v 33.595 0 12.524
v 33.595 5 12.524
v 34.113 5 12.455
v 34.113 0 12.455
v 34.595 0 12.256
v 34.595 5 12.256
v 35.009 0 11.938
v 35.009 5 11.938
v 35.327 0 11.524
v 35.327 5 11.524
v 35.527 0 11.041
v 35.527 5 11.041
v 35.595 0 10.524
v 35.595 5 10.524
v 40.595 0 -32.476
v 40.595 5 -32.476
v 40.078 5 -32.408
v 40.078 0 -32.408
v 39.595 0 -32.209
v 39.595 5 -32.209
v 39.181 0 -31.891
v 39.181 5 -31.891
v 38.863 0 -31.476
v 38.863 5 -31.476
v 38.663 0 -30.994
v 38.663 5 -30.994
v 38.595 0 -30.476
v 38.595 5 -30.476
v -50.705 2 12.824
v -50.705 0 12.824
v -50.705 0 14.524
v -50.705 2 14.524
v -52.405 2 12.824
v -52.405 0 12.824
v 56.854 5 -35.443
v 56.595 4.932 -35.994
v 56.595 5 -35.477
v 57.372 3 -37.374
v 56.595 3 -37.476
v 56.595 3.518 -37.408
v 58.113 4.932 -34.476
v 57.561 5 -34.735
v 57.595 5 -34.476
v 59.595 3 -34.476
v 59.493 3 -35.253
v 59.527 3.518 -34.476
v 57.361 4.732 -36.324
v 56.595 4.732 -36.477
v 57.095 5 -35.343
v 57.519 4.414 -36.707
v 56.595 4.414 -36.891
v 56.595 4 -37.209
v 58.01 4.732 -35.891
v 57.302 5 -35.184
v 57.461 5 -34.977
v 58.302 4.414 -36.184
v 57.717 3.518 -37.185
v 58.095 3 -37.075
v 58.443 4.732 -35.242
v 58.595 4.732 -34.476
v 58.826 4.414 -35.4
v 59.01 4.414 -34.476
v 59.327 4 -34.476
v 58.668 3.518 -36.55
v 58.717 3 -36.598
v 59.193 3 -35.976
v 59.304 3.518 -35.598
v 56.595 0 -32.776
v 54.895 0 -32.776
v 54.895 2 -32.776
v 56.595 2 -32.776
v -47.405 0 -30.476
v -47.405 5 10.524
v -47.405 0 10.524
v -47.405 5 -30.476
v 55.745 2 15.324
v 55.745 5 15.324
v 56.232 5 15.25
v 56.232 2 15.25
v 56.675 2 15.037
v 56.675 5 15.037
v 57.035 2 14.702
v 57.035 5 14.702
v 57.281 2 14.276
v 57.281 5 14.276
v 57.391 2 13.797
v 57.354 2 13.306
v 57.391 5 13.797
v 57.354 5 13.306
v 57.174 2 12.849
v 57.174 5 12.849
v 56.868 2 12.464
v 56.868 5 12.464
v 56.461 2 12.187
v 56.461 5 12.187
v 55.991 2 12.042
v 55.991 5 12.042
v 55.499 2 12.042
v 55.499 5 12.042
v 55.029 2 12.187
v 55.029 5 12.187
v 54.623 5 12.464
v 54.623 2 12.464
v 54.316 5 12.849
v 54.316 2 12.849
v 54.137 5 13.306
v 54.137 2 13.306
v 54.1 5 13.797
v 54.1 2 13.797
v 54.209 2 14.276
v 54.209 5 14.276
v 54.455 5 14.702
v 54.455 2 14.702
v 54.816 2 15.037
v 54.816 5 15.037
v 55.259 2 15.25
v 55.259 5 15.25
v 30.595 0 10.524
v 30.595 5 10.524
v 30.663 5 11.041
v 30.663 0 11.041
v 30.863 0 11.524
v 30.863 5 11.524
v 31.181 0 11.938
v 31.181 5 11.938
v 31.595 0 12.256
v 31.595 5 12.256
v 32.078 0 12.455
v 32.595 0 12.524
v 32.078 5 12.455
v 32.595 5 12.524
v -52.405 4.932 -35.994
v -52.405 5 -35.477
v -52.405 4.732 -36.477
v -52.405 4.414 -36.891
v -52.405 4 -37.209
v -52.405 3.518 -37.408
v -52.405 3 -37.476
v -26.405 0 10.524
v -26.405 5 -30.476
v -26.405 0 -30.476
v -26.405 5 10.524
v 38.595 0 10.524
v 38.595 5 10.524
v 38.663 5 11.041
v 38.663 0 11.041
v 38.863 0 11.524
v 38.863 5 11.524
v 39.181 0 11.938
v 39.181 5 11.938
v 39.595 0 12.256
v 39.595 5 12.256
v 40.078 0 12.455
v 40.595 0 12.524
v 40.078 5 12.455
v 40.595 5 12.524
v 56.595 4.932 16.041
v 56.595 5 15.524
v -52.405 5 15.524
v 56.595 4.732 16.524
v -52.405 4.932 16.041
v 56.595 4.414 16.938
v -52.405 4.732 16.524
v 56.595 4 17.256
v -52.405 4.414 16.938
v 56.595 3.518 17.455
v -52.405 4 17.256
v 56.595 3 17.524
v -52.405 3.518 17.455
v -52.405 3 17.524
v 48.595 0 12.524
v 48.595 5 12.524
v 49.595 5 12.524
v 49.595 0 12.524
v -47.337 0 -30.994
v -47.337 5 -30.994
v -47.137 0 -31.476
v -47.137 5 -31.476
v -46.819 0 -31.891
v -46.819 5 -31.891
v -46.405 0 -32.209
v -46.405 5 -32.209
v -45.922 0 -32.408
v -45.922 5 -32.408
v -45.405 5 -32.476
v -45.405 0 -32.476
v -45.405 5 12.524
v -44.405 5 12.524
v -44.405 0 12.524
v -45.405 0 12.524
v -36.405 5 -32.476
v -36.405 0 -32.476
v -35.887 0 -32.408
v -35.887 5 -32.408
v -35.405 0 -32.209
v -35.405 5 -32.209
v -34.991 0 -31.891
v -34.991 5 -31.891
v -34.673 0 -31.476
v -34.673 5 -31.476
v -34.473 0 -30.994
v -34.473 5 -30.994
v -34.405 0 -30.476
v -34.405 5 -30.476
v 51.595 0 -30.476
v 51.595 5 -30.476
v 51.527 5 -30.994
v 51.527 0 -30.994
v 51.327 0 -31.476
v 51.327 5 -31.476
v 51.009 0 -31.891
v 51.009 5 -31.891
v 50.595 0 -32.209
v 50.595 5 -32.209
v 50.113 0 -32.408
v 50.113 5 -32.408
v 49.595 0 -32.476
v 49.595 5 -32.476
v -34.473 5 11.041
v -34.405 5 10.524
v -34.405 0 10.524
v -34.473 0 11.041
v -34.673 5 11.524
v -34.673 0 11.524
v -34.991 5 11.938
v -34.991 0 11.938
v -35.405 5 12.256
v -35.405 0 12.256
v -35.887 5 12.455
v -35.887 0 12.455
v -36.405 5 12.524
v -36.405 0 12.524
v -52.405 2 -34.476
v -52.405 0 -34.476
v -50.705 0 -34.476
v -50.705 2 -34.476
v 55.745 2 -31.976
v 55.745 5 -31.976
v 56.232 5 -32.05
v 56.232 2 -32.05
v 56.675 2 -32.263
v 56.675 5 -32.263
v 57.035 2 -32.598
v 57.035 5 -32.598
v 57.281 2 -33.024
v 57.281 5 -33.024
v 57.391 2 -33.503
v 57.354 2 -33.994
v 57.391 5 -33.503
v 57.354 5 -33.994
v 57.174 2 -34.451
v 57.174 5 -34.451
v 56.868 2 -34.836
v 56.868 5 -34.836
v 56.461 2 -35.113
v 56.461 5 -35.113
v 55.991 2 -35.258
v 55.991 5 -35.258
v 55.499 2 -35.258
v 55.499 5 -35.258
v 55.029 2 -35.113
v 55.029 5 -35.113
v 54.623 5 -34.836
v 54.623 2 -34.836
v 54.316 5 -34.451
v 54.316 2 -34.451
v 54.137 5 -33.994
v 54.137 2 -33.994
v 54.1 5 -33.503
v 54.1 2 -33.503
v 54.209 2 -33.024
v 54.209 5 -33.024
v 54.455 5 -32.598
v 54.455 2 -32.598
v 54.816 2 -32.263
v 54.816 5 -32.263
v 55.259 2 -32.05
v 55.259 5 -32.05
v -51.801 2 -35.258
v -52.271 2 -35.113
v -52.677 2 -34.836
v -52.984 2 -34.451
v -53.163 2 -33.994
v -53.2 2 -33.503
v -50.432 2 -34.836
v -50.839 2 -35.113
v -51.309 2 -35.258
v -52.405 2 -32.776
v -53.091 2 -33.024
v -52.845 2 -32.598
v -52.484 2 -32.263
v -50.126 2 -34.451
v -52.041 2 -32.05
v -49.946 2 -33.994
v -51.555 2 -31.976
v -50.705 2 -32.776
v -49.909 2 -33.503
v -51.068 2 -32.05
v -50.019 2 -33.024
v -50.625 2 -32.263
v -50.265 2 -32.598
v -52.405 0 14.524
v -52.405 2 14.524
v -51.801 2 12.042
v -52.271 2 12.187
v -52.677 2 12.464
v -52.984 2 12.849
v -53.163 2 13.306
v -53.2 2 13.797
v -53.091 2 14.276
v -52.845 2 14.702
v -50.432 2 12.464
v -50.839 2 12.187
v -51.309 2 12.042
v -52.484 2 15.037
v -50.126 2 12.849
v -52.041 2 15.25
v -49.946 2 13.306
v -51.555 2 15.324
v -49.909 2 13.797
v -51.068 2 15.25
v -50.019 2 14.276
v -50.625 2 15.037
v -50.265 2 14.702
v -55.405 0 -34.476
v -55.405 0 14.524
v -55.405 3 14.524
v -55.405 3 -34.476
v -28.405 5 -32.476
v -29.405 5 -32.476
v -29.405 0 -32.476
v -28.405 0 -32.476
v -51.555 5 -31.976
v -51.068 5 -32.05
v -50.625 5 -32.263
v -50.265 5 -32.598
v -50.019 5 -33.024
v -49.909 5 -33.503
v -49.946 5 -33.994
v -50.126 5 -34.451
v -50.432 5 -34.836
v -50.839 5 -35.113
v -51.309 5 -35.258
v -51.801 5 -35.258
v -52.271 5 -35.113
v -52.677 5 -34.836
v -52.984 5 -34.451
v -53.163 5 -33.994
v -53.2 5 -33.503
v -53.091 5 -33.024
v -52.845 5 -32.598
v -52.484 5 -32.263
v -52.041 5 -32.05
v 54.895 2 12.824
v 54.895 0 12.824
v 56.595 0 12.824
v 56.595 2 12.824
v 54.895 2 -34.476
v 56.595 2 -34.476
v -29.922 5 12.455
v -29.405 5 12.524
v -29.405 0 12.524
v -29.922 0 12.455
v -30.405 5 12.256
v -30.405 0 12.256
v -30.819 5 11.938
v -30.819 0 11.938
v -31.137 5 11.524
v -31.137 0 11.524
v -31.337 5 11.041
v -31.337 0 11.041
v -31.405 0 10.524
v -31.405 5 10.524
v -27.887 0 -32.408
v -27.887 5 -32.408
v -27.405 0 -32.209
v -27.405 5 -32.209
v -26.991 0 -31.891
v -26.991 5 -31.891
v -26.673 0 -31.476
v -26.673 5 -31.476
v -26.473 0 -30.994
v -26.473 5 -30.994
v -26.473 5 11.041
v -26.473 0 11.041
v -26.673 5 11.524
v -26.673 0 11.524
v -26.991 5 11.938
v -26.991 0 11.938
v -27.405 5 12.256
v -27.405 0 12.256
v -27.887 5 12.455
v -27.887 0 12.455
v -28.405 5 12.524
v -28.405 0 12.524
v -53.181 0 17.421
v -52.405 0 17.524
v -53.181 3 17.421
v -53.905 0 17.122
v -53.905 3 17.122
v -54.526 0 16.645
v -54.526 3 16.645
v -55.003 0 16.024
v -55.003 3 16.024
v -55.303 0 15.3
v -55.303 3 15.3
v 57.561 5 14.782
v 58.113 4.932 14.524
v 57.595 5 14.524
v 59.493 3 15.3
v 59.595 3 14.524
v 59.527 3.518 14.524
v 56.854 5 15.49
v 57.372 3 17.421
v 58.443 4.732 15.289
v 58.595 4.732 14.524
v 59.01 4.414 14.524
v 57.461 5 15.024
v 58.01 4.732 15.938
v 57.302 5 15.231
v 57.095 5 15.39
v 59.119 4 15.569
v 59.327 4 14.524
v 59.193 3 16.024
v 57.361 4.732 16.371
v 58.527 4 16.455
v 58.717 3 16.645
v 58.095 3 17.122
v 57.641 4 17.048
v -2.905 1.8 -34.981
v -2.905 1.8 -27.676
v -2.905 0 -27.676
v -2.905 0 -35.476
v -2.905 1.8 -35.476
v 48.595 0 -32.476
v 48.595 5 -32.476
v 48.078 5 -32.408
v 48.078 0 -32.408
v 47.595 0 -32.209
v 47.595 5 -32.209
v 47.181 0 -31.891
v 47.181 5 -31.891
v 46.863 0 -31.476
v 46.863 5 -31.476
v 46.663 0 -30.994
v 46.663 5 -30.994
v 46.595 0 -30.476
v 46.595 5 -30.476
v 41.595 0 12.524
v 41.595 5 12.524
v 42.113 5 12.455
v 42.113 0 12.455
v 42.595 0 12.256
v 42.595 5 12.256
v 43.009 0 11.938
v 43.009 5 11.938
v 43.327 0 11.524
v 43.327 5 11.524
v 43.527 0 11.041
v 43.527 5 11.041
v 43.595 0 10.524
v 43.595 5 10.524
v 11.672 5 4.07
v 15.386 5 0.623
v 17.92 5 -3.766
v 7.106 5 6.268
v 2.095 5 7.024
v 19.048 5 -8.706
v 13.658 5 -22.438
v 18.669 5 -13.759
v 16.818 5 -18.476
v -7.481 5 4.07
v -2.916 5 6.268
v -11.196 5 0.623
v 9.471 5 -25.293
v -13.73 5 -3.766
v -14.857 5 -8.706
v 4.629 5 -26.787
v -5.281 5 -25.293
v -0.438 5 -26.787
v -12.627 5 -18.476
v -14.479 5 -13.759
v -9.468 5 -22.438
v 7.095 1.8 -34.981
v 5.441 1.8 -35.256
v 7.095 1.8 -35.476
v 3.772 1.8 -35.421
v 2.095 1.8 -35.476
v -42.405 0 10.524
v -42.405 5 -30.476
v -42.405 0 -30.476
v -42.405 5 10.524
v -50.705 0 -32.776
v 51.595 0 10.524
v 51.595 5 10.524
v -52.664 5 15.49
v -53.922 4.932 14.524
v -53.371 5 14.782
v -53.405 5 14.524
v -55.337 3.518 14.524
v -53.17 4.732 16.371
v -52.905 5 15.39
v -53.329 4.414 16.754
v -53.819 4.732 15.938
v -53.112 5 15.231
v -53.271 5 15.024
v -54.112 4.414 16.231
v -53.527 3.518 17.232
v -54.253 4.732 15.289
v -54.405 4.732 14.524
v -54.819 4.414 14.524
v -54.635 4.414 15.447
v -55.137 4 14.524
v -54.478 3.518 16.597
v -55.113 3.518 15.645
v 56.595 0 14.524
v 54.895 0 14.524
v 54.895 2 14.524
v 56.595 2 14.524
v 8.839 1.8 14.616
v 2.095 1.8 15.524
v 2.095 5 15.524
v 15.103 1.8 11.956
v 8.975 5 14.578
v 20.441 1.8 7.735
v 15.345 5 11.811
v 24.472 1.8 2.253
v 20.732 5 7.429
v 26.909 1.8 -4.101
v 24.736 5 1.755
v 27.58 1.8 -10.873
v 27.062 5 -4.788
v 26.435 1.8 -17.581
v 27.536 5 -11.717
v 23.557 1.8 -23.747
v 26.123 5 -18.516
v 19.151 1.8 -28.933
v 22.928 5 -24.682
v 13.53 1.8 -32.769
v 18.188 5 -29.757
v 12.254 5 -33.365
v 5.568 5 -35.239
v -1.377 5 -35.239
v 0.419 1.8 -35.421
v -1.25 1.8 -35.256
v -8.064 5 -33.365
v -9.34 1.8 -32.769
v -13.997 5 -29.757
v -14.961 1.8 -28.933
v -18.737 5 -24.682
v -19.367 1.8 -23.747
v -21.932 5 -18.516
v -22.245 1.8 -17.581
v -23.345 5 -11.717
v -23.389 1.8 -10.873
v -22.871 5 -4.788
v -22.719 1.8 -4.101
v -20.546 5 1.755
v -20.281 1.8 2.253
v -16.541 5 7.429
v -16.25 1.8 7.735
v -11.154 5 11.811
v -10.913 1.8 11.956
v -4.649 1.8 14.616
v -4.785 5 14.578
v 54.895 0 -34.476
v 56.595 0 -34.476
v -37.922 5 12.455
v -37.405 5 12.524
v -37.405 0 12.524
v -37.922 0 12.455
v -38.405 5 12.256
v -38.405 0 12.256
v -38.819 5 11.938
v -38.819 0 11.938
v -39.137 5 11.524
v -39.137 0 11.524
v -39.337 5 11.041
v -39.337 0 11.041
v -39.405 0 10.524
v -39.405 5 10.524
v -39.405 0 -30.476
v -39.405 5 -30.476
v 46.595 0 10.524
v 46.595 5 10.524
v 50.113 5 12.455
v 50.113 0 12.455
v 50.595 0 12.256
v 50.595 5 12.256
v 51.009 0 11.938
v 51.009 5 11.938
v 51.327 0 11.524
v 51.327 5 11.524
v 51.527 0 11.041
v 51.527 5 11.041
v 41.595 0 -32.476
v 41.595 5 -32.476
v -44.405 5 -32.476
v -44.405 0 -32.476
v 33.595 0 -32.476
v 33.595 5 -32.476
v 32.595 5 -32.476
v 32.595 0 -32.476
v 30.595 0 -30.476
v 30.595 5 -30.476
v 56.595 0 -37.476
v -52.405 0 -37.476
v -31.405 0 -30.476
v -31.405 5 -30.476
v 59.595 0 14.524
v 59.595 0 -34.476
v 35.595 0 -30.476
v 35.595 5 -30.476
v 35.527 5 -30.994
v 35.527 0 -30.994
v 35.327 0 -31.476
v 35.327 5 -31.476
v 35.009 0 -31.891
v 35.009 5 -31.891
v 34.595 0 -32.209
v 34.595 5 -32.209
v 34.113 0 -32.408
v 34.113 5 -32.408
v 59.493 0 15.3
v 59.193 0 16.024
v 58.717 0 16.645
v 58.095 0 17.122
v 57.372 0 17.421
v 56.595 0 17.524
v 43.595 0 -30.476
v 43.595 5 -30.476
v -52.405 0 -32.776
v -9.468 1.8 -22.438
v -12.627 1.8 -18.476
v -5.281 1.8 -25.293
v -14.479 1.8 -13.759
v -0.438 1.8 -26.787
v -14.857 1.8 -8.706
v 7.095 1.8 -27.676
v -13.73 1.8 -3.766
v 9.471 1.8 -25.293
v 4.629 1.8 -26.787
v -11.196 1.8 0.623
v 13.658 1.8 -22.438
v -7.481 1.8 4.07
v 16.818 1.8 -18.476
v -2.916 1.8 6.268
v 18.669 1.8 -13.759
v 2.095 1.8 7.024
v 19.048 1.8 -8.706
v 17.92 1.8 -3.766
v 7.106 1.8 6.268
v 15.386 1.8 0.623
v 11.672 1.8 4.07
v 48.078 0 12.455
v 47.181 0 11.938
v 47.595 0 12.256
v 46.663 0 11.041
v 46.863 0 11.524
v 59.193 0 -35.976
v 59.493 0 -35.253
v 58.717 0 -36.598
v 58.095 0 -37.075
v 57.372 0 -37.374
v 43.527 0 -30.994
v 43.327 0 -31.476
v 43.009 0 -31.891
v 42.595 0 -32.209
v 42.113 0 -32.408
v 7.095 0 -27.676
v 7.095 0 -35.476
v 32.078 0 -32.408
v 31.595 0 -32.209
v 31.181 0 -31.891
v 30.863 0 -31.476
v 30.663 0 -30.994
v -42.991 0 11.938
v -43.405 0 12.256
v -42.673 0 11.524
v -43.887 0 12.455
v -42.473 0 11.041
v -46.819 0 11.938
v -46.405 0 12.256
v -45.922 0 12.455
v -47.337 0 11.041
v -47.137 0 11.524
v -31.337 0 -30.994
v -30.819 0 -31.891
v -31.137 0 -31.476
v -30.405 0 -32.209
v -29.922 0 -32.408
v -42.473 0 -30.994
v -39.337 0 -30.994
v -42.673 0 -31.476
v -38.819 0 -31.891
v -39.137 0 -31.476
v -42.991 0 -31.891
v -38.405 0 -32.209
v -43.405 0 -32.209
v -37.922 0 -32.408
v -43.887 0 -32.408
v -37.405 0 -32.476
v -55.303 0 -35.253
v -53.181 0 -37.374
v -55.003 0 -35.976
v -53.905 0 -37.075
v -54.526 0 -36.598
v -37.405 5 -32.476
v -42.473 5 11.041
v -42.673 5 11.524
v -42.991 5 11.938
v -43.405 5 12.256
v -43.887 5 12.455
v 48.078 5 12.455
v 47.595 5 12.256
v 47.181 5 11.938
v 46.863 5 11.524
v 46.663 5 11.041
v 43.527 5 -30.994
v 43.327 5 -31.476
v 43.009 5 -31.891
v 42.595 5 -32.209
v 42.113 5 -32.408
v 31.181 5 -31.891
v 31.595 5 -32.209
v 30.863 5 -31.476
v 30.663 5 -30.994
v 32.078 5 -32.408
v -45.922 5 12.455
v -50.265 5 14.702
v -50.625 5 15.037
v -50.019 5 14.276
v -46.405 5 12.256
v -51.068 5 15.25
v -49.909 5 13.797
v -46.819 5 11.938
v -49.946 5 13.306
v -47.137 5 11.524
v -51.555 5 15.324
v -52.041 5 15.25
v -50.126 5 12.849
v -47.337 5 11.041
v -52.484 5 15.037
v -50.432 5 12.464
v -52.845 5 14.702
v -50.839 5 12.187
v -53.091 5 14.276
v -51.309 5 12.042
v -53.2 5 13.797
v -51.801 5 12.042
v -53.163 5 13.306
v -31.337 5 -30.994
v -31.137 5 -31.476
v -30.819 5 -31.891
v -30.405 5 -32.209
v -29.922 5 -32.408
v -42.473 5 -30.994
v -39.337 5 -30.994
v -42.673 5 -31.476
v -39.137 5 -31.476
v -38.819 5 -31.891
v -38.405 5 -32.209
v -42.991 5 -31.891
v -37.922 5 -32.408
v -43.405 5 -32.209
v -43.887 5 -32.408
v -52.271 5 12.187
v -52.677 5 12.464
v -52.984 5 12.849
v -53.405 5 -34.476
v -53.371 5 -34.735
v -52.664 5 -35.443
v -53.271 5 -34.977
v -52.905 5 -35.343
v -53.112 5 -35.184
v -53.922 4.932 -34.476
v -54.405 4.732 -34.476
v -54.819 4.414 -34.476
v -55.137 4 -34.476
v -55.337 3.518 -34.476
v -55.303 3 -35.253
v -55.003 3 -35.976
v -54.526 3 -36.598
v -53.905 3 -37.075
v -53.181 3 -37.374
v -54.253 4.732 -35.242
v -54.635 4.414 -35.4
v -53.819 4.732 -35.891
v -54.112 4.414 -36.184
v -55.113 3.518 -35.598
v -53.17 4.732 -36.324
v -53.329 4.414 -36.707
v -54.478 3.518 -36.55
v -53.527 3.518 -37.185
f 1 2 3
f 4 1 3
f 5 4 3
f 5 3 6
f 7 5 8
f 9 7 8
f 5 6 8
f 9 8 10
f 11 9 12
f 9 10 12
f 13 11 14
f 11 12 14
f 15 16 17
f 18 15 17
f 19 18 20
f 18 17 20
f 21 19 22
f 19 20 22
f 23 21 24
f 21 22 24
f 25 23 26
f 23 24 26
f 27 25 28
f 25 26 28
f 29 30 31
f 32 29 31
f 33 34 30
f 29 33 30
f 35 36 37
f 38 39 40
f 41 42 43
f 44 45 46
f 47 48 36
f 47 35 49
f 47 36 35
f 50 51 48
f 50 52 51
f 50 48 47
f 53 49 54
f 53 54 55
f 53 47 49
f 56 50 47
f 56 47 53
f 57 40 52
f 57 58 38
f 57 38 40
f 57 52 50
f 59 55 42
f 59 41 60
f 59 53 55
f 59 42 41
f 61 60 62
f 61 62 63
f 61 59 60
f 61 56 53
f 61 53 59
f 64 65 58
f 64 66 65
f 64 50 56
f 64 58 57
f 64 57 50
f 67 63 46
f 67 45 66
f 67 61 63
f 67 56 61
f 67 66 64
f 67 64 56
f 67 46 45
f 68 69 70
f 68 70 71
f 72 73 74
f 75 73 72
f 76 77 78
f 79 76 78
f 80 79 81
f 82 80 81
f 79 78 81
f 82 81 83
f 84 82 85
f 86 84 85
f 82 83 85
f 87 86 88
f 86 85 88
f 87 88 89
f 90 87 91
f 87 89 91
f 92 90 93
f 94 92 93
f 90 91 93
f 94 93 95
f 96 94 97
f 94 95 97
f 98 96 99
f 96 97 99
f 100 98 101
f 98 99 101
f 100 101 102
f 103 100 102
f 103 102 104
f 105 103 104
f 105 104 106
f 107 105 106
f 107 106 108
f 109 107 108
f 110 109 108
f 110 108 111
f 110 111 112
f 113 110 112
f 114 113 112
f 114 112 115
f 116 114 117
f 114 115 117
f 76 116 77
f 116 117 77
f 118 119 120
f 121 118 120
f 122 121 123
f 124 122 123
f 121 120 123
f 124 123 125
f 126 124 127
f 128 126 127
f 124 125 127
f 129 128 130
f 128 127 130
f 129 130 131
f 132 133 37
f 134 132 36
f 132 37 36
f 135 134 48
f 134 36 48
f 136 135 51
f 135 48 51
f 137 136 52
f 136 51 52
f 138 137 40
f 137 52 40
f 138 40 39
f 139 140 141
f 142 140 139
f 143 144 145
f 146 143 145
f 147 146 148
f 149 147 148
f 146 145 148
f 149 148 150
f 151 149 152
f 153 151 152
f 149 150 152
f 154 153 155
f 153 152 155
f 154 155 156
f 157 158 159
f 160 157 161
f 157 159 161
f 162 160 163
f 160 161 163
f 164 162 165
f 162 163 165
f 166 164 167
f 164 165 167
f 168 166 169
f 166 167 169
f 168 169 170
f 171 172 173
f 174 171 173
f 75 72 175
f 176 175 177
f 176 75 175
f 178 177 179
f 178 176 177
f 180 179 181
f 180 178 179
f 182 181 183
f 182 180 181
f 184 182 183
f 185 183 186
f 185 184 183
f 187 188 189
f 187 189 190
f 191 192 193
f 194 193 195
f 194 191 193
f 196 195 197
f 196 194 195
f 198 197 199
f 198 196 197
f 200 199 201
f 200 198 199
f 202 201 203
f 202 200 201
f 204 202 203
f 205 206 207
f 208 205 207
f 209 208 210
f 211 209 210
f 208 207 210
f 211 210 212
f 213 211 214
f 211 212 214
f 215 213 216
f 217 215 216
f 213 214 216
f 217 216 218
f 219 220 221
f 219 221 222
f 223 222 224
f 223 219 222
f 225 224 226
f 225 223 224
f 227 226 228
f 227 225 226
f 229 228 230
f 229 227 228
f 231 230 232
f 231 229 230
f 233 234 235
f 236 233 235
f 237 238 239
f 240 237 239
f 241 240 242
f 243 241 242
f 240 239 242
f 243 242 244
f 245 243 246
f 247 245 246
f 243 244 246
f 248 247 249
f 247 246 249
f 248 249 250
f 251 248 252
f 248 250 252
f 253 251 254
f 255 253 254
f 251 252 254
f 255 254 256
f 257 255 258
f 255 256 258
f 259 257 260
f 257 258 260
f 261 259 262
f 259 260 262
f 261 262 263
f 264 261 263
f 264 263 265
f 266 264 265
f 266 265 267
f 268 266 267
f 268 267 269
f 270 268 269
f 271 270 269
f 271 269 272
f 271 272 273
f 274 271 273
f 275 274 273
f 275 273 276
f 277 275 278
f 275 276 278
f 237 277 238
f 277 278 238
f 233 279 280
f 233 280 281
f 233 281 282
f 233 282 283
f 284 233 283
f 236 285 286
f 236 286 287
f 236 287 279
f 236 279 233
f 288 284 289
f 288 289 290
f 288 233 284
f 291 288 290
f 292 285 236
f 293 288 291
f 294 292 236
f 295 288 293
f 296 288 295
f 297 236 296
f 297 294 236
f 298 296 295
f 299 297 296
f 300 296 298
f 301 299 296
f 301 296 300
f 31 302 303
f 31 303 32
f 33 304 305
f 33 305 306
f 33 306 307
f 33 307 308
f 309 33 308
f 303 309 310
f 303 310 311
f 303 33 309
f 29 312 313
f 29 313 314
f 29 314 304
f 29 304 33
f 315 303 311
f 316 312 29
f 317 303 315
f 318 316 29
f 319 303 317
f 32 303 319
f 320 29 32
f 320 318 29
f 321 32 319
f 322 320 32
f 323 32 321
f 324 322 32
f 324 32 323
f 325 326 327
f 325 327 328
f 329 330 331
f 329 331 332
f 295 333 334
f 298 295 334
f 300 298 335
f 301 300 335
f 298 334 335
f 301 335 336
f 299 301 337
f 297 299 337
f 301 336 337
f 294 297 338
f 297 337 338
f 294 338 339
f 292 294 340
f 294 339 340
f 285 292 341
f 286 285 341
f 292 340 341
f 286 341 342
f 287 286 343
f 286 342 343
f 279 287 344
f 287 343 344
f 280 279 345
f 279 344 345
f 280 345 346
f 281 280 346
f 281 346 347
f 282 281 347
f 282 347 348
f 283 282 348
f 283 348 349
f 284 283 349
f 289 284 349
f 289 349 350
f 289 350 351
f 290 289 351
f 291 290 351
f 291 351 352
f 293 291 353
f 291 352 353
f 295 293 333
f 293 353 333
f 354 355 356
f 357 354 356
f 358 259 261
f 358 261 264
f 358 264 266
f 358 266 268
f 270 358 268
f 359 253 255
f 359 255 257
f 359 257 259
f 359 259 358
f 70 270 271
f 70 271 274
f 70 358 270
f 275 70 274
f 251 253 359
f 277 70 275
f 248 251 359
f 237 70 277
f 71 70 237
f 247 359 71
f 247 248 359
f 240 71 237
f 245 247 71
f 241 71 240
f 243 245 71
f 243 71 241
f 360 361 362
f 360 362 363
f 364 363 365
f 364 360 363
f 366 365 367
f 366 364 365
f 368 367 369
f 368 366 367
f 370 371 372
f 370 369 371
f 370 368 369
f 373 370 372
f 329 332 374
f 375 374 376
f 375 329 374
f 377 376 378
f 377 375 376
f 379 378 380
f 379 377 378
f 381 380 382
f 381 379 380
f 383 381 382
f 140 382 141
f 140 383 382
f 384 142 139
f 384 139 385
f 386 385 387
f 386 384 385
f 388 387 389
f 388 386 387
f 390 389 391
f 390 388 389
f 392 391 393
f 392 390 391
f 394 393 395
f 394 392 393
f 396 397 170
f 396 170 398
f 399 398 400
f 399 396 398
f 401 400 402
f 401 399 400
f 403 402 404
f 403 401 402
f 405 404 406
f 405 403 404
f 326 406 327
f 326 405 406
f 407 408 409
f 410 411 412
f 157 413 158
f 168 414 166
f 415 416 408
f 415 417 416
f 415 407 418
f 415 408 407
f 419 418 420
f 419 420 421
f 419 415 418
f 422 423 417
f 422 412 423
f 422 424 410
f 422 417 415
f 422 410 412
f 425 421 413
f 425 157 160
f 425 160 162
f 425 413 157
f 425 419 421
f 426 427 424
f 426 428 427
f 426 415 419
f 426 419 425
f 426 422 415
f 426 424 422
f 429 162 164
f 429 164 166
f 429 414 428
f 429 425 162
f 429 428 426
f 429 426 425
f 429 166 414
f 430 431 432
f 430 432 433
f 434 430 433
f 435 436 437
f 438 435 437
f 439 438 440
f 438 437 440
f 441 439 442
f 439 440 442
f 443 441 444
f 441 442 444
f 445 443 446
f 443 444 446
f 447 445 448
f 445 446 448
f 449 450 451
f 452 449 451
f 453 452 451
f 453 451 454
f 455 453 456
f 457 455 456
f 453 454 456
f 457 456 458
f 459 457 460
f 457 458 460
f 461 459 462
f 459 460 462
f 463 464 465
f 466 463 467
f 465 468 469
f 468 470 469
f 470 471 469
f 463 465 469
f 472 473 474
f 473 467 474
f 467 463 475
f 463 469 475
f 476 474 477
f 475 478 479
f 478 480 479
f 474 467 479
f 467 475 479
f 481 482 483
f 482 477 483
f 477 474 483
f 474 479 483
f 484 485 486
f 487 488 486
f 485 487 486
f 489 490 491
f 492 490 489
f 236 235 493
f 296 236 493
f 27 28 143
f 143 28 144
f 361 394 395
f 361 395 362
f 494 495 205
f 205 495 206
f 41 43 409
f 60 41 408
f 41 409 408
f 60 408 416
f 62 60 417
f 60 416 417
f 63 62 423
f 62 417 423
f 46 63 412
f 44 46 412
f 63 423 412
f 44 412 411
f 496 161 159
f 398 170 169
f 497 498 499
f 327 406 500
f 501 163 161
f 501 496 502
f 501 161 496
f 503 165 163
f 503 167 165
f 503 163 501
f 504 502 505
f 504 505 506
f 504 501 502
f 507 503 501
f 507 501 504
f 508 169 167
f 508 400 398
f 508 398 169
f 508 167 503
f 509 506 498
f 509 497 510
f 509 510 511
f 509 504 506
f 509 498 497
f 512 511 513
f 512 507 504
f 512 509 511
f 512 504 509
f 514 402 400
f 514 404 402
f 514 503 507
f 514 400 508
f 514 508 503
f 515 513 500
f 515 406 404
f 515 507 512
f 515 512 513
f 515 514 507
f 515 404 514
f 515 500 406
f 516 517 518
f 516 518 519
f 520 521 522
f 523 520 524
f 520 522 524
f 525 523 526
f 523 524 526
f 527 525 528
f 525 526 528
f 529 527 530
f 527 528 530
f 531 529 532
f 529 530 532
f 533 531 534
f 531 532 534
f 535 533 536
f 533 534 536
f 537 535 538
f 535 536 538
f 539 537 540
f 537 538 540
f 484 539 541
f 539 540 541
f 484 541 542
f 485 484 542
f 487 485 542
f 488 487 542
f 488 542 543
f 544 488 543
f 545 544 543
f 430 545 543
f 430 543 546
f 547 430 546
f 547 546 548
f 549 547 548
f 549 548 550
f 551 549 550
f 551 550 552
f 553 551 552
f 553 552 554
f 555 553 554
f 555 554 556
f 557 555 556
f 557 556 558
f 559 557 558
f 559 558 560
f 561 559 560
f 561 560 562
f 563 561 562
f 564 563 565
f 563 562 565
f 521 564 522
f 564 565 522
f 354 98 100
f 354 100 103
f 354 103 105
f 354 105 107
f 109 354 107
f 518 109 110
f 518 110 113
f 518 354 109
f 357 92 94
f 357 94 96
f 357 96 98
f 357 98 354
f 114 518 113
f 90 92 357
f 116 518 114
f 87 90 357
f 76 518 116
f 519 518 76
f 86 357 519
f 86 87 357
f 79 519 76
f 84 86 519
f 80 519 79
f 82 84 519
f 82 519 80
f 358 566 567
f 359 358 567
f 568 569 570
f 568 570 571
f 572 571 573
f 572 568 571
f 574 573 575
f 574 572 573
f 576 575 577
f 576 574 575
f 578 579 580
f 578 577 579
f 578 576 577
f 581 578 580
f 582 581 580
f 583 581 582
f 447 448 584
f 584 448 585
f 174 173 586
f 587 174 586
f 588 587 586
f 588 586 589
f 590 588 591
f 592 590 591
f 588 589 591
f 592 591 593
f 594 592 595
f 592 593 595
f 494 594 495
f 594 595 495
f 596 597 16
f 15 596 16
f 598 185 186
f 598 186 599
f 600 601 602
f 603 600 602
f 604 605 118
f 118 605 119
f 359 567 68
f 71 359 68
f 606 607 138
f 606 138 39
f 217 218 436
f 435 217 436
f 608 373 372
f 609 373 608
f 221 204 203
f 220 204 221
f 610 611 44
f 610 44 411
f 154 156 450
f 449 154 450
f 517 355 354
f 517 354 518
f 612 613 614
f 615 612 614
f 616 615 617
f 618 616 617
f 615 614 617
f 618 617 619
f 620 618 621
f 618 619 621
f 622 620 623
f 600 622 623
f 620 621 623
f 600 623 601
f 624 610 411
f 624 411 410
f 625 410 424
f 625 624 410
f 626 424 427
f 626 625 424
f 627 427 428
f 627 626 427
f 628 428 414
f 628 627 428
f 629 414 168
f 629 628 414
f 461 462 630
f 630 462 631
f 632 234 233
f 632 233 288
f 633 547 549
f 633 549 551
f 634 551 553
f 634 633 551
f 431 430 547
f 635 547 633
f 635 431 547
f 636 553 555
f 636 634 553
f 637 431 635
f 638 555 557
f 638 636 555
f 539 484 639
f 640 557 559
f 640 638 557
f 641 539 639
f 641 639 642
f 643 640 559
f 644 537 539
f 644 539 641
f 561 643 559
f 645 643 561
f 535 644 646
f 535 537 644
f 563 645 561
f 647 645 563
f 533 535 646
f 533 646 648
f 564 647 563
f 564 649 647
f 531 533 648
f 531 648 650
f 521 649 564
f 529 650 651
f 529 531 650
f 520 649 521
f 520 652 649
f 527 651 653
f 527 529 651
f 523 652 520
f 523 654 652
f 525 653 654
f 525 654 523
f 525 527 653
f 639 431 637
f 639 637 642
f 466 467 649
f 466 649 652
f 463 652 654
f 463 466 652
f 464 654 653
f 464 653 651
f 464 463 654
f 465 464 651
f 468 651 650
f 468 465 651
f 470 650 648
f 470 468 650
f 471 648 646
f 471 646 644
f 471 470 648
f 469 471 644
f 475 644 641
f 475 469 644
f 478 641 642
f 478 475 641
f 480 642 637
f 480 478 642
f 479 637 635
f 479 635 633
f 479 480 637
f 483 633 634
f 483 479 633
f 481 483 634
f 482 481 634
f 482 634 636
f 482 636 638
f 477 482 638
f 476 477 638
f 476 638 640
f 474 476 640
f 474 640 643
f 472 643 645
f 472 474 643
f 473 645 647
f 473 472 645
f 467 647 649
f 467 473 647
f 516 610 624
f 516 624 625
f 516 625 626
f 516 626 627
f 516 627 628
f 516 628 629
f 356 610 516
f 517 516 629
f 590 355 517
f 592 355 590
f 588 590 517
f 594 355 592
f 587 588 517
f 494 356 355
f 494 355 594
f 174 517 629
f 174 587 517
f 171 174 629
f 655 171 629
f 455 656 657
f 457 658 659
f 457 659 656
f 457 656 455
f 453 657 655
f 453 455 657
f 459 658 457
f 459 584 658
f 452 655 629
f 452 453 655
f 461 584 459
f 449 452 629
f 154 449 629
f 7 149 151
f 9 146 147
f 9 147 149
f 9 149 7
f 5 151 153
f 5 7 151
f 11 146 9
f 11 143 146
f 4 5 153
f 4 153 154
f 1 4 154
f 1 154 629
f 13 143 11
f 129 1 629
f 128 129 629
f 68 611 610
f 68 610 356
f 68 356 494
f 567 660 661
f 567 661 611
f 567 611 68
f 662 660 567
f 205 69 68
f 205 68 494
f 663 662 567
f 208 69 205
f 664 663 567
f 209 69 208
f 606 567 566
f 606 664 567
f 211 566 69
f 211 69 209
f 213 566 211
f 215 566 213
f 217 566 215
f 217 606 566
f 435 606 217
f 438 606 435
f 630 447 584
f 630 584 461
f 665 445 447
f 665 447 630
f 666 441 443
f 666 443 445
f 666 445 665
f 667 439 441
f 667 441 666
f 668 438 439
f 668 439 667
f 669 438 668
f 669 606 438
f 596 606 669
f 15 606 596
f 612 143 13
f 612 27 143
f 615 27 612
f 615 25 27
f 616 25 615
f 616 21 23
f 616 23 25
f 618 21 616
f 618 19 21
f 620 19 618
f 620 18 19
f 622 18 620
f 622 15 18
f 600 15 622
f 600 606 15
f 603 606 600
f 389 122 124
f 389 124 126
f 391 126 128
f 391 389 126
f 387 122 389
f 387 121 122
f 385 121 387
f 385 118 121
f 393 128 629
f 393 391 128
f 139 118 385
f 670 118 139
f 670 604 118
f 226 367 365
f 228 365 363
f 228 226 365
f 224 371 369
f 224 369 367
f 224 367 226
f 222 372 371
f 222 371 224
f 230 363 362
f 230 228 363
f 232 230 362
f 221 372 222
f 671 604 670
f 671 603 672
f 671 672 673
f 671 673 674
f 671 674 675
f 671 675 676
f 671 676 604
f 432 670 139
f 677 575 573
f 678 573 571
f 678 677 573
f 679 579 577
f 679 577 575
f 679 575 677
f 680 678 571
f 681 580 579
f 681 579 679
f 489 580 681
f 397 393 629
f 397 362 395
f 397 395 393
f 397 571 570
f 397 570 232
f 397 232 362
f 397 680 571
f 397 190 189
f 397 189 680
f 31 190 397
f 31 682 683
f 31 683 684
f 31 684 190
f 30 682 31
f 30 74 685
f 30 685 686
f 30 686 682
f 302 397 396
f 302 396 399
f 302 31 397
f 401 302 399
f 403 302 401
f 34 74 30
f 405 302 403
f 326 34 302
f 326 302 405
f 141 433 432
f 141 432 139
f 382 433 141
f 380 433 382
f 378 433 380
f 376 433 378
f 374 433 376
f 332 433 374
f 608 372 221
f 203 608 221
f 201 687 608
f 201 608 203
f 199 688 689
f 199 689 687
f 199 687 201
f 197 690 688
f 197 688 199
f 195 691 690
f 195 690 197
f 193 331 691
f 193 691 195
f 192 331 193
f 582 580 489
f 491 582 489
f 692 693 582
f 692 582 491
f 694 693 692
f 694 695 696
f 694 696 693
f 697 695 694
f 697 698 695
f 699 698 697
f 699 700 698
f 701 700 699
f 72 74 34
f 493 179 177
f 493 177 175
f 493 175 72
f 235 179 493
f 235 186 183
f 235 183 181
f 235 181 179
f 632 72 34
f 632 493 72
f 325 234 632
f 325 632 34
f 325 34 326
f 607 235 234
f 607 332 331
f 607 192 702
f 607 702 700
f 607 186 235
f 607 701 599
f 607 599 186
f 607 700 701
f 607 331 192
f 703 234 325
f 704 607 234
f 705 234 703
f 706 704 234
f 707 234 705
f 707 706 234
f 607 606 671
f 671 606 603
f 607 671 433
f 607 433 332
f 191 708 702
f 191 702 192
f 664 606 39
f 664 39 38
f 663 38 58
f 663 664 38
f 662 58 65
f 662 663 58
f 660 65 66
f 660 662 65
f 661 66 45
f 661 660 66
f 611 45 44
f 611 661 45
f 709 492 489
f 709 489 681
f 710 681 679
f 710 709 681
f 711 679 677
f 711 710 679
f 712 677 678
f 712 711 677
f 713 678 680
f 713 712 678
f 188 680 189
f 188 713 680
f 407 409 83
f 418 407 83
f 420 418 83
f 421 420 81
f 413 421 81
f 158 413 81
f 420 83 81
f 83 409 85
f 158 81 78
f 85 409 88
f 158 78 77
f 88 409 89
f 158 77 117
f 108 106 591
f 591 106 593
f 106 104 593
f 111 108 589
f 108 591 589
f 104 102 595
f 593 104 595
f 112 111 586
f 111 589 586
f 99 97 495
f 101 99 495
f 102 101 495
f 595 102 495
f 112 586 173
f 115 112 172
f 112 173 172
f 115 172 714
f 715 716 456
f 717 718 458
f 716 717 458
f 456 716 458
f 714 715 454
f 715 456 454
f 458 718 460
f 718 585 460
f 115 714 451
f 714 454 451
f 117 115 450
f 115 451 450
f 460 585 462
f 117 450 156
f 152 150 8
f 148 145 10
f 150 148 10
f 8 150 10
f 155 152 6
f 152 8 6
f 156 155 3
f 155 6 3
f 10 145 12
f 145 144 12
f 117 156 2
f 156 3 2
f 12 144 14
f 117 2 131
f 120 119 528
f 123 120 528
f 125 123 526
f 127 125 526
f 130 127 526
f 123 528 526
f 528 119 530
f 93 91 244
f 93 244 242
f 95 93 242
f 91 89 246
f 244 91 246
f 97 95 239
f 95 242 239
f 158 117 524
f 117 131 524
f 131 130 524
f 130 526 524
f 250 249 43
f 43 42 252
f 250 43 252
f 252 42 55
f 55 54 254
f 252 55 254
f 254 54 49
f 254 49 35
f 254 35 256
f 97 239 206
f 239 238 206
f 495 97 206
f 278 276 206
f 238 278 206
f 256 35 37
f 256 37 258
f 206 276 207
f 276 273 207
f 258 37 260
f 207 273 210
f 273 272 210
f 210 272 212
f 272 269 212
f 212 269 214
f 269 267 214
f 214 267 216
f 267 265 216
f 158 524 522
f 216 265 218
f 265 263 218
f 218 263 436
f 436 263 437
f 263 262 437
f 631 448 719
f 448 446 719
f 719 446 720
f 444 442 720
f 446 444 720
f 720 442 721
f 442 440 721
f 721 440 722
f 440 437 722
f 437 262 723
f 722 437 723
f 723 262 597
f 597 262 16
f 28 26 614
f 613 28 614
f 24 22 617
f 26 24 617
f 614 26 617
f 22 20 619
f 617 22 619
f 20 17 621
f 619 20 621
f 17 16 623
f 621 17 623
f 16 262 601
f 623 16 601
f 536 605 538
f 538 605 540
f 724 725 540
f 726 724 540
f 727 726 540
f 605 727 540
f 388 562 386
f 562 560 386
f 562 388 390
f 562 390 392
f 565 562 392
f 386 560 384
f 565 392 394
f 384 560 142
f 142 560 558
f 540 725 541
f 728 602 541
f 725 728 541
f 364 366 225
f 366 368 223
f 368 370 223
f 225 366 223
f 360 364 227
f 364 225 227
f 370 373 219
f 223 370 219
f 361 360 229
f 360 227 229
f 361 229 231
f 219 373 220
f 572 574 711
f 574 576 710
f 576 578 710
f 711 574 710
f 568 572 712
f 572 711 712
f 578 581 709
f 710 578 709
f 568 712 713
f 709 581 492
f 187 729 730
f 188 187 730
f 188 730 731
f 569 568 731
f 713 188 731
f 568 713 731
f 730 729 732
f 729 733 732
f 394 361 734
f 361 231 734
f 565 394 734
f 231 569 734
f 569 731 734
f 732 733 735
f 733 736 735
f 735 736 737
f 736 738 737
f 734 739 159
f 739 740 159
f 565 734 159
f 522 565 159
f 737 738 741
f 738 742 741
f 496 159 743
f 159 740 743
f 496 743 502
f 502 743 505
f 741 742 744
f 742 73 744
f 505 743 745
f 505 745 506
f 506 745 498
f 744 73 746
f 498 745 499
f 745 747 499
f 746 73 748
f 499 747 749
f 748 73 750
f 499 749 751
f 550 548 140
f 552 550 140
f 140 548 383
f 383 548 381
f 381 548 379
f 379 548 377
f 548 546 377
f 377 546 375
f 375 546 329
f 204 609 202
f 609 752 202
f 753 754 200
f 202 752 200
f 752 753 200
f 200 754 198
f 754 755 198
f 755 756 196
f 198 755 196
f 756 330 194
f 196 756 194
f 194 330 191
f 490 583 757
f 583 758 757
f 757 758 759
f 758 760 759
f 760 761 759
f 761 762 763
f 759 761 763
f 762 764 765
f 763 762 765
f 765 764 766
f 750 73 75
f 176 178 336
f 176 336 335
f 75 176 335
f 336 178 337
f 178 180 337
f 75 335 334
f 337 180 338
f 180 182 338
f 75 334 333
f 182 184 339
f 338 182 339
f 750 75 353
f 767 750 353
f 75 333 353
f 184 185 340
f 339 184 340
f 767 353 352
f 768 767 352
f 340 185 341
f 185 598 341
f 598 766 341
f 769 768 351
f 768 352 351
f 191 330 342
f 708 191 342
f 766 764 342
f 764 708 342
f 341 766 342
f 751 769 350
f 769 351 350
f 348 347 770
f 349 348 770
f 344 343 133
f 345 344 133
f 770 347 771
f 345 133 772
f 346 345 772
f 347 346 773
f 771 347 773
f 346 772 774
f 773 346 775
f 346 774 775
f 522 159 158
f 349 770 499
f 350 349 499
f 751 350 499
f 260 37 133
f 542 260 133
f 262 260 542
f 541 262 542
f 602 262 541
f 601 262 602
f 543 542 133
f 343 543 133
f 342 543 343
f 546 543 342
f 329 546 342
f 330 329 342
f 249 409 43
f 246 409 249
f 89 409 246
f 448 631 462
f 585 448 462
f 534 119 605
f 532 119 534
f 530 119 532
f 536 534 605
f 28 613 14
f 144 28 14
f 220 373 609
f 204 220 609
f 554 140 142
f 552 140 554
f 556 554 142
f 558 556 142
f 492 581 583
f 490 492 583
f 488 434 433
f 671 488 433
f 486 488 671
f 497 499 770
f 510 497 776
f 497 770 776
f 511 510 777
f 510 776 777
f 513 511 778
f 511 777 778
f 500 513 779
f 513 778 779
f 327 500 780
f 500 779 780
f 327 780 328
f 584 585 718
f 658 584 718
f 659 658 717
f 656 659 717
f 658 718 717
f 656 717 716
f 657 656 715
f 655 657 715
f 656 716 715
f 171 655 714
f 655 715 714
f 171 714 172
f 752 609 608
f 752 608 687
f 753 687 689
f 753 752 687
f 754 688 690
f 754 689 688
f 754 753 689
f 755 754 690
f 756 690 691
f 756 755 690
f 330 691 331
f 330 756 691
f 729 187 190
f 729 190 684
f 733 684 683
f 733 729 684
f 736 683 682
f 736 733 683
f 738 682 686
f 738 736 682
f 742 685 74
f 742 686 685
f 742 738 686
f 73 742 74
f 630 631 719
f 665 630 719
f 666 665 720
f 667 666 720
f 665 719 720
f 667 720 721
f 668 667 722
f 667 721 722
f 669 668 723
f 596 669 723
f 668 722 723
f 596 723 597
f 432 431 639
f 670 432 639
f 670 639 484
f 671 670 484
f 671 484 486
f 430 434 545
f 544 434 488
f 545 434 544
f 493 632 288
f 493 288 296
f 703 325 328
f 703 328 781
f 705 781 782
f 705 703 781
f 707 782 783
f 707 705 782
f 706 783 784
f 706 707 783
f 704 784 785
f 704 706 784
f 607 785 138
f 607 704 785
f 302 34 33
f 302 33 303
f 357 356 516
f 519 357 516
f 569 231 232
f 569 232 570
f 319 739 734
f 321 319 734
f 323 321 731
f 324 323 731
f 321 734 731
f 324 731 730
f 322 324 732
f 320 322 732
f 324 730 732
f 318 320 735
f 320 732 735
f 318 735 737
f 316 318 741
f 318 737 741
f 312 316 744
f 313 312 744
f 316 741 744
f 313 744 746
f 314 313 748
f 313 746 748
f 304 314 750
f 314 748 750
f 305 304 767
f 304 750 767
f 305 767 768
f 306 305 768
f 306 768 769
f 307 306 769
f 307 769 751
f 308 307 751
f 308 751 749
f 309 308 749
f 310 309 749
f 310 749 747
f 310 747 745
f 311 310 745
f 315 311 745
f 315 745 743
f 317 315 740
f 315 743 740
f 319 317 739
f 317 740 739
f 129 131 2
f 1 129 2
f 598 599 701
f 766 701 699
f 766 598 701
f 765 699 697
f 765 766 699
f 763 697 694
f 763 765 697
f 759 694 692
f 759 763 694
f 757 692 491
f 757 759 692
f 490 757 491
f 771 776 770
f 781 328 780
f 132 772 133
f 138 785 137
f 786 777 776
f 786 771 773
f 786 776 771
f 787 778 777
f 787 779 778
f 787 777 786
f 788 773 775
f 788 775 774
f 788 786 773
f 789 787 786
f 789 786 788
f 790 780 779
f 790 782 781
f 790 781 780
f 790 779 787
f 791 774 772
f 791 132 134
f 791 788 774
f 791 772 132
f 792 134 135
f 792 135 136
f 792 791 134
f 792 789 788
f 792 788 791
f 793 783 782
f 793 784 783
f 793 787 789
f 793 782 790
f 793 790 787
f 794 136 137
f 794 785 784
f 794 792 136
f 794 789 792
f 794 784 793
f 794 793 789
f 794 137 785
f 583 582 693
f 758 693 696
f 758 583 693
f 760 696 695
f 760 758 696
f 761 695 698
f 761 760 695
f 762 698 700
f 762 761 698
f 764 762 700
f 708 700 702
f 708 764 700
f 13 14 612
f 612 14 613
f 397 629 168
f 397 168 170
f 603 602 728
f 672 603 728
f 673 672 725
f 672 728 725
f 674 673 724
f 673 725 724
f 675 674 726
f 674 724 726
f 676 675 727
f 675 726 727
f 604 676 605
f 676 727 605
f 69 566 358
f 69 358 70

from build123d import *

# Parameters (mm, degrees)
EXTRUDE_1_DEPTH     = 5
SKETCH_2_R          = 25.5
SKETCH_2_R_2        = 17
CUT_EXTRUDE_1_DEPTH = 3.2
CUT_EXTRUDE_2_DEPTH = 18.2
FILLET_1_R          = 2
SKETCH_4_W          = 1.7
SKETCH_4_H          = 1.7
CUT_EXTRUDE_3_DEPTH = 71
SKETCH_5_R          = 1.65
CUT_EXTRUDE_4_DEPTH = 3
SKETCH_6_W          = 10
SKETCH_6_H          = 7.8
CUT_EXTRUDE_5_DEPTH = 9.4


with BuildPart() as part:
    # Эскиз1 → Бобышка-Вытянуть1 (new body)
    with BuildSketch(Plane(origin=(0, 0, 0), x_dir=(1, 0, 0), z_dir=(0, 1, 0))):
        with BuildLine():
            Line((-52.404740413, 37.47648532), (56.595259587, 37.47648532))
            ThreePointArc((56.595259587, 37.47648532), (58.716579931, 36.597805664), (59.595259587, 34.47648532))
            Line((59.595259587, 34.47648532), (59.595259587, -14.52351468))
            ThreePointArc((59.595259587, -14.52351468), (58.716579931, -16.644835023), (56.595259587, -17.52351468))
            Line((56.595259587, -17.52351468), (-52.404740413, -17.52351468))
            ThreePointArc((-52.404740413, -17.52351468), (-54.526060756, -16.644835023), (-55.404740413, -14.52351468))
            Line((-55.404740413, -14.52351468), (-55.404740413, 34.47648532))
            ThreePointArc((-55.404740413, 34.47648532), (-54.526060756, 36.597805664), (-52.404740413, 37.47648532))
        make_face()
    extrude(amount=EXTRUDE_1_DEPTH)

    # Эскиз2 → Вырез-Вытянуть1 (cut)
    with BuildSketch(Plane(origin=(0, 5, 0), x_dir=(1, 0, 0), z_dir=(0, 1, 0))):
        with Locations(Location((2.095259587, 9.97648532, 0), (0, 0, 270))):
            Circle(SKETCH_2_R)
        with Locations(Location((2.095259587, 9.97648532, 0), (0, 0, 270))):
            Circle(SKETCH_2_R_2, mode=Mode.SUBTRACT)
    extrude(amount=-CUT_EXTRUDE_1_DEPTH, mode=Mode.SUBTRACT)

    # Эскиз3 → Вырез-Вытянуть2 (cut)
    with BuildSketch(Plane(origin=(0, 5, 0), x_dir=(1, 0, 0), z_dir=(0, 1, 0))):
        with BuildLine():
            Line((-45.404740413, 32.47648532), (-44.404740413, 32.47648532))
            ThreePointArc((-44.404740413, 32.47648532), (-42.99052685, 31.890698883), (-42.404740413, 30.47648532))
            Line((-42.404740413, 30.47648532), (-42.404740413, -10.52351468))
            ThreePointArc((-42.404740413, -10.52351468), (-42.99052685, -11.937728242), (-44.404740413, -12.52351468))
            Line((-44.404740413, -12.52351468), (-45.404740413, -12.52351468))
            ThreePointArc((-45.404740413, -12.52351468), (-46.818953975, -11.937728242), (-47.404740413, -10.52351468))
            Line((-47.404740413, -10.52351468), (-47.404740413, 30.47648532))
            ThreePointArc((-47.404740413, 30.47648532), (-46.818953975, 31.890698883), (-45.404740413, 32.47648532))
        make_face()
        with BuildLine():
            Line((-37.404740413, 32.47648532), (-36.404740413, 32.47648532))
            ThreePointArc((-36.404740413, 32.47648532), (-34.99052685, 31.890698883), (-34.404740413, 30.47648532))
            Line((-34.404740413, 30.47648532), (-34.404740413, -10.52351468))
            ThreePointArc((-34.404740413, -10.52351468), (-34.99052685, -11.937728242), (-36.404740413, -12.52351468))
            Line((-36.404740413, -12.52351468), (-37.404740413, -12.52351468))
            ThreePointArc((-37.404740413, -12.52351468), (-38.818953975, -11.937728242), (-39.404740413, -10.52351468))
            Line((-39.404740413, -10.52351468), (-39.404740413, 30.47648532))
            ThreePointArc((-39.404740413, 30.47648532), (-38.818953975, 31.890698883), (-37.404740413, 32.47648532))
        make_face()
        with BuildLine():
            Line((-29.404740413, 32.47648532), (-28.404740413, 32.47648532))
            ThreePointArc((-28.404740413, 32.47648532), (-26.99052685, 31.890698883), (-26.404740413, 30.47648532))
            Line((-26.404740413, 30.47648532), (-26.404740413, -10.52351468))
            ThreePointArc((-26.404740413, -10.52351468), (-26.99052685, -11.937728242), (-28.404740413, -12.52351468))
            Line((-28.404740413, -12.52351468), (-29.404740413, -12.52351468))
            ThreePointArc((-29.404740413, -12.52351468), (-30.818953975, -11.937728242), (-31.404740413, -10.52351468))
            Line((-31.404740413, -10.52351468), (-31.404740413, 30.47648532))
            ThreePointArc((-31.404740413, 30.47648532), (-30.818953975, 31.890698883), (-29.404740413, 32.47648532))
        make_face()
        with BuildLine():
            Line((49.595259587, 32.47648532), (48.595259587, 32.47648532))
            ThreePointArc((48.595259587, 32.47648532), (47.181046025, 31.890698883), (46.595259587, 30.47648532))
            Line((46.595259587, 30.47648532), (46.595259587, -10.52351468))
            ThreePointArc((46.595259587, -10.52351468), (47.181046025, -11.937728242), (48.595259587, -12.52351468))
            Line((48.595259587, -12.52351468), (49.595259587, -12.52351468))
            ThreePointArc((49.595259587, -12.52351468), (51.00947315, -11.937728242), (51.595259587, -10.52351468))
            Line((51.595259587, -10.52351468), (51.595259587, 30.47648532))
            ThreePointArc((51.595259587, 30.47648532), (51.00947315, 31.890698883), (49.595259587, 32.47648532))
        make_face()
        with BuildLine():
            Line((41.595259587, 32.47648532), (40.595259587, 32.47648532))
            ThreePointArc((40.595259587, 32.47648532), (39.181046025, 31.890698883), (38.595259587, 30.47648532))
            Line((38.595259587, 30.47648532), (38.595259587, -10.52351468))
            ThreePointArc((38.595259587, -10.52351468), (39.181046025, -11.937728242), (40.595259587, -12.52351468))
            Line((40.595259587, -12.52351468), (41.595259587, -12.52351468))
            ThreePointArc((41.595259587, -12.52351468), (43.00947315, -11.937728242), (43.595259587, -10.52351468))
            Line((43.595259587, -10.52351468), (43.595259587, 30.47648532))
            ThreePointArc((43.595259587, 30.47648532), (43.00947315, 31.890698883), (41.595259587, 32.47648532))
        make_face()
        with BuildLine():
            Line((33.595259587, 32.47648532), (32.595259587, 32.47648532))
            ThreePointArc((32.595259587, 32.47648532), (31.181046025, 31.890698883), (30.595259587, 30.47648532))
            Line((30.595259587, 30.47648532), (30.595259587, -10.52351468))
            ThreePointArc((30.595259587, -10.52351468), (31.181046025, -11.937728242), (32.595259587, -12.52351468))
            Line((32.595259587, -12.52351468), (33.595259587, -12.52351468))
            ThreePointArc((33.595259587, -12.52351468), (35.00947315, -11.937728242), (35.595259587, -10.52351468))
            Line((35.595259587, -10.52351468), (35.595259587, 30.47648532))
            ThreePointArc((35.595259587, 30.47648532), (35.00947315, 31.890698883), (33.595259587, 32.47648532))
        make_face()
    extrude(amount=-CUT_EXTRUDE_2_DEPTH, mode=Mode.SUBTRACT)

    # Скругление1
    fillet_1_edges = [part.edges().sort_by_distance(p)[0] for p in [
        (58.716579931, 5, 16.644835023),
        (59.595259587, 5, -9.97648532),
        (58.716579931, 5, -36.597805664),
        (2.095259587, 5, -37.47648532),
        (-54.526060756, 5, -36.597805664),
        (-55.404740413, 5, -9.97648532),
        (-54.526060756, 5, 16.644835023),
        (2.095259587, 5, 17.52351468),
    ]]
    fillet(fillet_1_edges, radius=FILLET_1_R - 0.0001)  # a hair under: the kernel refuses the full size

    # Эскиз4 → Вырез-Вытянуть3 (cut)
    with BuildSketch(Plane.XZ):
        with Locations((-51.554740413, 13.67351468)):
            Rectangle(SKETCH_4_W, SKETCH_4_H)
        with Locations((-51.554740413, -33.62648532)):
            Rectangle(SKETCH_4_W, SKETCH_4_H)
        with Locations((55.745259587, -33.62648532)):
            Rectangle(SKETCH_4_W, SKETCH_4_H)
        with Locations((55.745259587, 13.67351468)):
            Rectangle(SKETCH_4_W, SKETCH_4_H)
    extrude(amount=-CUT_EXTRUDE_3_DEPTH, mode=Mode.SUBTRACT)

    # Эскиз5 → Вырез-Вытянуть4 (cut)
    with BuildSketch(Plane(origin=(0, 5, 0), x_dir=(1, 0, 0), z_dir=(0, 1, 0))):
        with Locations(Location((-51.554740413, 33.62648532, 0), (0, 0, 270))):
            Circle(SKETCH_5_R)
        with Locations(Location((-51.554740413, -13.67351468, 0), (0, 0, 270))):
            Circle(SKETCH_5_R)
        with Locations(Location((55.745259587, 33.62648532, 0), (0, 0, 270))):
            Circle(SKETCH_5_R)
        with Locations(Location((55.745259587, -13.67351468, 0), (0, 0, 270))):
            Circle(SKETCH_5_R)
    extrude(amount=-CUT_EXTRUDE_4_DEPTH, mode=Mode.SUBTRACT)

    # Эскиз6 → Вырез-Вытянуть5 (cut)
    with BuildSketch(Plane(origin=(0, 1.8, 0), x_dir=(1, 0, 0), z_dir=(0, 1, 0))):
        with Locations((2.095259587, 31.57648532)):
            Rectangle(SKETCH_6_W, SKETCH_6_H)
    extrude(amount=-CUT_EXTRUDE_5_DEPTH, mode=Mode.SUBTRACT)


solid = part.part
